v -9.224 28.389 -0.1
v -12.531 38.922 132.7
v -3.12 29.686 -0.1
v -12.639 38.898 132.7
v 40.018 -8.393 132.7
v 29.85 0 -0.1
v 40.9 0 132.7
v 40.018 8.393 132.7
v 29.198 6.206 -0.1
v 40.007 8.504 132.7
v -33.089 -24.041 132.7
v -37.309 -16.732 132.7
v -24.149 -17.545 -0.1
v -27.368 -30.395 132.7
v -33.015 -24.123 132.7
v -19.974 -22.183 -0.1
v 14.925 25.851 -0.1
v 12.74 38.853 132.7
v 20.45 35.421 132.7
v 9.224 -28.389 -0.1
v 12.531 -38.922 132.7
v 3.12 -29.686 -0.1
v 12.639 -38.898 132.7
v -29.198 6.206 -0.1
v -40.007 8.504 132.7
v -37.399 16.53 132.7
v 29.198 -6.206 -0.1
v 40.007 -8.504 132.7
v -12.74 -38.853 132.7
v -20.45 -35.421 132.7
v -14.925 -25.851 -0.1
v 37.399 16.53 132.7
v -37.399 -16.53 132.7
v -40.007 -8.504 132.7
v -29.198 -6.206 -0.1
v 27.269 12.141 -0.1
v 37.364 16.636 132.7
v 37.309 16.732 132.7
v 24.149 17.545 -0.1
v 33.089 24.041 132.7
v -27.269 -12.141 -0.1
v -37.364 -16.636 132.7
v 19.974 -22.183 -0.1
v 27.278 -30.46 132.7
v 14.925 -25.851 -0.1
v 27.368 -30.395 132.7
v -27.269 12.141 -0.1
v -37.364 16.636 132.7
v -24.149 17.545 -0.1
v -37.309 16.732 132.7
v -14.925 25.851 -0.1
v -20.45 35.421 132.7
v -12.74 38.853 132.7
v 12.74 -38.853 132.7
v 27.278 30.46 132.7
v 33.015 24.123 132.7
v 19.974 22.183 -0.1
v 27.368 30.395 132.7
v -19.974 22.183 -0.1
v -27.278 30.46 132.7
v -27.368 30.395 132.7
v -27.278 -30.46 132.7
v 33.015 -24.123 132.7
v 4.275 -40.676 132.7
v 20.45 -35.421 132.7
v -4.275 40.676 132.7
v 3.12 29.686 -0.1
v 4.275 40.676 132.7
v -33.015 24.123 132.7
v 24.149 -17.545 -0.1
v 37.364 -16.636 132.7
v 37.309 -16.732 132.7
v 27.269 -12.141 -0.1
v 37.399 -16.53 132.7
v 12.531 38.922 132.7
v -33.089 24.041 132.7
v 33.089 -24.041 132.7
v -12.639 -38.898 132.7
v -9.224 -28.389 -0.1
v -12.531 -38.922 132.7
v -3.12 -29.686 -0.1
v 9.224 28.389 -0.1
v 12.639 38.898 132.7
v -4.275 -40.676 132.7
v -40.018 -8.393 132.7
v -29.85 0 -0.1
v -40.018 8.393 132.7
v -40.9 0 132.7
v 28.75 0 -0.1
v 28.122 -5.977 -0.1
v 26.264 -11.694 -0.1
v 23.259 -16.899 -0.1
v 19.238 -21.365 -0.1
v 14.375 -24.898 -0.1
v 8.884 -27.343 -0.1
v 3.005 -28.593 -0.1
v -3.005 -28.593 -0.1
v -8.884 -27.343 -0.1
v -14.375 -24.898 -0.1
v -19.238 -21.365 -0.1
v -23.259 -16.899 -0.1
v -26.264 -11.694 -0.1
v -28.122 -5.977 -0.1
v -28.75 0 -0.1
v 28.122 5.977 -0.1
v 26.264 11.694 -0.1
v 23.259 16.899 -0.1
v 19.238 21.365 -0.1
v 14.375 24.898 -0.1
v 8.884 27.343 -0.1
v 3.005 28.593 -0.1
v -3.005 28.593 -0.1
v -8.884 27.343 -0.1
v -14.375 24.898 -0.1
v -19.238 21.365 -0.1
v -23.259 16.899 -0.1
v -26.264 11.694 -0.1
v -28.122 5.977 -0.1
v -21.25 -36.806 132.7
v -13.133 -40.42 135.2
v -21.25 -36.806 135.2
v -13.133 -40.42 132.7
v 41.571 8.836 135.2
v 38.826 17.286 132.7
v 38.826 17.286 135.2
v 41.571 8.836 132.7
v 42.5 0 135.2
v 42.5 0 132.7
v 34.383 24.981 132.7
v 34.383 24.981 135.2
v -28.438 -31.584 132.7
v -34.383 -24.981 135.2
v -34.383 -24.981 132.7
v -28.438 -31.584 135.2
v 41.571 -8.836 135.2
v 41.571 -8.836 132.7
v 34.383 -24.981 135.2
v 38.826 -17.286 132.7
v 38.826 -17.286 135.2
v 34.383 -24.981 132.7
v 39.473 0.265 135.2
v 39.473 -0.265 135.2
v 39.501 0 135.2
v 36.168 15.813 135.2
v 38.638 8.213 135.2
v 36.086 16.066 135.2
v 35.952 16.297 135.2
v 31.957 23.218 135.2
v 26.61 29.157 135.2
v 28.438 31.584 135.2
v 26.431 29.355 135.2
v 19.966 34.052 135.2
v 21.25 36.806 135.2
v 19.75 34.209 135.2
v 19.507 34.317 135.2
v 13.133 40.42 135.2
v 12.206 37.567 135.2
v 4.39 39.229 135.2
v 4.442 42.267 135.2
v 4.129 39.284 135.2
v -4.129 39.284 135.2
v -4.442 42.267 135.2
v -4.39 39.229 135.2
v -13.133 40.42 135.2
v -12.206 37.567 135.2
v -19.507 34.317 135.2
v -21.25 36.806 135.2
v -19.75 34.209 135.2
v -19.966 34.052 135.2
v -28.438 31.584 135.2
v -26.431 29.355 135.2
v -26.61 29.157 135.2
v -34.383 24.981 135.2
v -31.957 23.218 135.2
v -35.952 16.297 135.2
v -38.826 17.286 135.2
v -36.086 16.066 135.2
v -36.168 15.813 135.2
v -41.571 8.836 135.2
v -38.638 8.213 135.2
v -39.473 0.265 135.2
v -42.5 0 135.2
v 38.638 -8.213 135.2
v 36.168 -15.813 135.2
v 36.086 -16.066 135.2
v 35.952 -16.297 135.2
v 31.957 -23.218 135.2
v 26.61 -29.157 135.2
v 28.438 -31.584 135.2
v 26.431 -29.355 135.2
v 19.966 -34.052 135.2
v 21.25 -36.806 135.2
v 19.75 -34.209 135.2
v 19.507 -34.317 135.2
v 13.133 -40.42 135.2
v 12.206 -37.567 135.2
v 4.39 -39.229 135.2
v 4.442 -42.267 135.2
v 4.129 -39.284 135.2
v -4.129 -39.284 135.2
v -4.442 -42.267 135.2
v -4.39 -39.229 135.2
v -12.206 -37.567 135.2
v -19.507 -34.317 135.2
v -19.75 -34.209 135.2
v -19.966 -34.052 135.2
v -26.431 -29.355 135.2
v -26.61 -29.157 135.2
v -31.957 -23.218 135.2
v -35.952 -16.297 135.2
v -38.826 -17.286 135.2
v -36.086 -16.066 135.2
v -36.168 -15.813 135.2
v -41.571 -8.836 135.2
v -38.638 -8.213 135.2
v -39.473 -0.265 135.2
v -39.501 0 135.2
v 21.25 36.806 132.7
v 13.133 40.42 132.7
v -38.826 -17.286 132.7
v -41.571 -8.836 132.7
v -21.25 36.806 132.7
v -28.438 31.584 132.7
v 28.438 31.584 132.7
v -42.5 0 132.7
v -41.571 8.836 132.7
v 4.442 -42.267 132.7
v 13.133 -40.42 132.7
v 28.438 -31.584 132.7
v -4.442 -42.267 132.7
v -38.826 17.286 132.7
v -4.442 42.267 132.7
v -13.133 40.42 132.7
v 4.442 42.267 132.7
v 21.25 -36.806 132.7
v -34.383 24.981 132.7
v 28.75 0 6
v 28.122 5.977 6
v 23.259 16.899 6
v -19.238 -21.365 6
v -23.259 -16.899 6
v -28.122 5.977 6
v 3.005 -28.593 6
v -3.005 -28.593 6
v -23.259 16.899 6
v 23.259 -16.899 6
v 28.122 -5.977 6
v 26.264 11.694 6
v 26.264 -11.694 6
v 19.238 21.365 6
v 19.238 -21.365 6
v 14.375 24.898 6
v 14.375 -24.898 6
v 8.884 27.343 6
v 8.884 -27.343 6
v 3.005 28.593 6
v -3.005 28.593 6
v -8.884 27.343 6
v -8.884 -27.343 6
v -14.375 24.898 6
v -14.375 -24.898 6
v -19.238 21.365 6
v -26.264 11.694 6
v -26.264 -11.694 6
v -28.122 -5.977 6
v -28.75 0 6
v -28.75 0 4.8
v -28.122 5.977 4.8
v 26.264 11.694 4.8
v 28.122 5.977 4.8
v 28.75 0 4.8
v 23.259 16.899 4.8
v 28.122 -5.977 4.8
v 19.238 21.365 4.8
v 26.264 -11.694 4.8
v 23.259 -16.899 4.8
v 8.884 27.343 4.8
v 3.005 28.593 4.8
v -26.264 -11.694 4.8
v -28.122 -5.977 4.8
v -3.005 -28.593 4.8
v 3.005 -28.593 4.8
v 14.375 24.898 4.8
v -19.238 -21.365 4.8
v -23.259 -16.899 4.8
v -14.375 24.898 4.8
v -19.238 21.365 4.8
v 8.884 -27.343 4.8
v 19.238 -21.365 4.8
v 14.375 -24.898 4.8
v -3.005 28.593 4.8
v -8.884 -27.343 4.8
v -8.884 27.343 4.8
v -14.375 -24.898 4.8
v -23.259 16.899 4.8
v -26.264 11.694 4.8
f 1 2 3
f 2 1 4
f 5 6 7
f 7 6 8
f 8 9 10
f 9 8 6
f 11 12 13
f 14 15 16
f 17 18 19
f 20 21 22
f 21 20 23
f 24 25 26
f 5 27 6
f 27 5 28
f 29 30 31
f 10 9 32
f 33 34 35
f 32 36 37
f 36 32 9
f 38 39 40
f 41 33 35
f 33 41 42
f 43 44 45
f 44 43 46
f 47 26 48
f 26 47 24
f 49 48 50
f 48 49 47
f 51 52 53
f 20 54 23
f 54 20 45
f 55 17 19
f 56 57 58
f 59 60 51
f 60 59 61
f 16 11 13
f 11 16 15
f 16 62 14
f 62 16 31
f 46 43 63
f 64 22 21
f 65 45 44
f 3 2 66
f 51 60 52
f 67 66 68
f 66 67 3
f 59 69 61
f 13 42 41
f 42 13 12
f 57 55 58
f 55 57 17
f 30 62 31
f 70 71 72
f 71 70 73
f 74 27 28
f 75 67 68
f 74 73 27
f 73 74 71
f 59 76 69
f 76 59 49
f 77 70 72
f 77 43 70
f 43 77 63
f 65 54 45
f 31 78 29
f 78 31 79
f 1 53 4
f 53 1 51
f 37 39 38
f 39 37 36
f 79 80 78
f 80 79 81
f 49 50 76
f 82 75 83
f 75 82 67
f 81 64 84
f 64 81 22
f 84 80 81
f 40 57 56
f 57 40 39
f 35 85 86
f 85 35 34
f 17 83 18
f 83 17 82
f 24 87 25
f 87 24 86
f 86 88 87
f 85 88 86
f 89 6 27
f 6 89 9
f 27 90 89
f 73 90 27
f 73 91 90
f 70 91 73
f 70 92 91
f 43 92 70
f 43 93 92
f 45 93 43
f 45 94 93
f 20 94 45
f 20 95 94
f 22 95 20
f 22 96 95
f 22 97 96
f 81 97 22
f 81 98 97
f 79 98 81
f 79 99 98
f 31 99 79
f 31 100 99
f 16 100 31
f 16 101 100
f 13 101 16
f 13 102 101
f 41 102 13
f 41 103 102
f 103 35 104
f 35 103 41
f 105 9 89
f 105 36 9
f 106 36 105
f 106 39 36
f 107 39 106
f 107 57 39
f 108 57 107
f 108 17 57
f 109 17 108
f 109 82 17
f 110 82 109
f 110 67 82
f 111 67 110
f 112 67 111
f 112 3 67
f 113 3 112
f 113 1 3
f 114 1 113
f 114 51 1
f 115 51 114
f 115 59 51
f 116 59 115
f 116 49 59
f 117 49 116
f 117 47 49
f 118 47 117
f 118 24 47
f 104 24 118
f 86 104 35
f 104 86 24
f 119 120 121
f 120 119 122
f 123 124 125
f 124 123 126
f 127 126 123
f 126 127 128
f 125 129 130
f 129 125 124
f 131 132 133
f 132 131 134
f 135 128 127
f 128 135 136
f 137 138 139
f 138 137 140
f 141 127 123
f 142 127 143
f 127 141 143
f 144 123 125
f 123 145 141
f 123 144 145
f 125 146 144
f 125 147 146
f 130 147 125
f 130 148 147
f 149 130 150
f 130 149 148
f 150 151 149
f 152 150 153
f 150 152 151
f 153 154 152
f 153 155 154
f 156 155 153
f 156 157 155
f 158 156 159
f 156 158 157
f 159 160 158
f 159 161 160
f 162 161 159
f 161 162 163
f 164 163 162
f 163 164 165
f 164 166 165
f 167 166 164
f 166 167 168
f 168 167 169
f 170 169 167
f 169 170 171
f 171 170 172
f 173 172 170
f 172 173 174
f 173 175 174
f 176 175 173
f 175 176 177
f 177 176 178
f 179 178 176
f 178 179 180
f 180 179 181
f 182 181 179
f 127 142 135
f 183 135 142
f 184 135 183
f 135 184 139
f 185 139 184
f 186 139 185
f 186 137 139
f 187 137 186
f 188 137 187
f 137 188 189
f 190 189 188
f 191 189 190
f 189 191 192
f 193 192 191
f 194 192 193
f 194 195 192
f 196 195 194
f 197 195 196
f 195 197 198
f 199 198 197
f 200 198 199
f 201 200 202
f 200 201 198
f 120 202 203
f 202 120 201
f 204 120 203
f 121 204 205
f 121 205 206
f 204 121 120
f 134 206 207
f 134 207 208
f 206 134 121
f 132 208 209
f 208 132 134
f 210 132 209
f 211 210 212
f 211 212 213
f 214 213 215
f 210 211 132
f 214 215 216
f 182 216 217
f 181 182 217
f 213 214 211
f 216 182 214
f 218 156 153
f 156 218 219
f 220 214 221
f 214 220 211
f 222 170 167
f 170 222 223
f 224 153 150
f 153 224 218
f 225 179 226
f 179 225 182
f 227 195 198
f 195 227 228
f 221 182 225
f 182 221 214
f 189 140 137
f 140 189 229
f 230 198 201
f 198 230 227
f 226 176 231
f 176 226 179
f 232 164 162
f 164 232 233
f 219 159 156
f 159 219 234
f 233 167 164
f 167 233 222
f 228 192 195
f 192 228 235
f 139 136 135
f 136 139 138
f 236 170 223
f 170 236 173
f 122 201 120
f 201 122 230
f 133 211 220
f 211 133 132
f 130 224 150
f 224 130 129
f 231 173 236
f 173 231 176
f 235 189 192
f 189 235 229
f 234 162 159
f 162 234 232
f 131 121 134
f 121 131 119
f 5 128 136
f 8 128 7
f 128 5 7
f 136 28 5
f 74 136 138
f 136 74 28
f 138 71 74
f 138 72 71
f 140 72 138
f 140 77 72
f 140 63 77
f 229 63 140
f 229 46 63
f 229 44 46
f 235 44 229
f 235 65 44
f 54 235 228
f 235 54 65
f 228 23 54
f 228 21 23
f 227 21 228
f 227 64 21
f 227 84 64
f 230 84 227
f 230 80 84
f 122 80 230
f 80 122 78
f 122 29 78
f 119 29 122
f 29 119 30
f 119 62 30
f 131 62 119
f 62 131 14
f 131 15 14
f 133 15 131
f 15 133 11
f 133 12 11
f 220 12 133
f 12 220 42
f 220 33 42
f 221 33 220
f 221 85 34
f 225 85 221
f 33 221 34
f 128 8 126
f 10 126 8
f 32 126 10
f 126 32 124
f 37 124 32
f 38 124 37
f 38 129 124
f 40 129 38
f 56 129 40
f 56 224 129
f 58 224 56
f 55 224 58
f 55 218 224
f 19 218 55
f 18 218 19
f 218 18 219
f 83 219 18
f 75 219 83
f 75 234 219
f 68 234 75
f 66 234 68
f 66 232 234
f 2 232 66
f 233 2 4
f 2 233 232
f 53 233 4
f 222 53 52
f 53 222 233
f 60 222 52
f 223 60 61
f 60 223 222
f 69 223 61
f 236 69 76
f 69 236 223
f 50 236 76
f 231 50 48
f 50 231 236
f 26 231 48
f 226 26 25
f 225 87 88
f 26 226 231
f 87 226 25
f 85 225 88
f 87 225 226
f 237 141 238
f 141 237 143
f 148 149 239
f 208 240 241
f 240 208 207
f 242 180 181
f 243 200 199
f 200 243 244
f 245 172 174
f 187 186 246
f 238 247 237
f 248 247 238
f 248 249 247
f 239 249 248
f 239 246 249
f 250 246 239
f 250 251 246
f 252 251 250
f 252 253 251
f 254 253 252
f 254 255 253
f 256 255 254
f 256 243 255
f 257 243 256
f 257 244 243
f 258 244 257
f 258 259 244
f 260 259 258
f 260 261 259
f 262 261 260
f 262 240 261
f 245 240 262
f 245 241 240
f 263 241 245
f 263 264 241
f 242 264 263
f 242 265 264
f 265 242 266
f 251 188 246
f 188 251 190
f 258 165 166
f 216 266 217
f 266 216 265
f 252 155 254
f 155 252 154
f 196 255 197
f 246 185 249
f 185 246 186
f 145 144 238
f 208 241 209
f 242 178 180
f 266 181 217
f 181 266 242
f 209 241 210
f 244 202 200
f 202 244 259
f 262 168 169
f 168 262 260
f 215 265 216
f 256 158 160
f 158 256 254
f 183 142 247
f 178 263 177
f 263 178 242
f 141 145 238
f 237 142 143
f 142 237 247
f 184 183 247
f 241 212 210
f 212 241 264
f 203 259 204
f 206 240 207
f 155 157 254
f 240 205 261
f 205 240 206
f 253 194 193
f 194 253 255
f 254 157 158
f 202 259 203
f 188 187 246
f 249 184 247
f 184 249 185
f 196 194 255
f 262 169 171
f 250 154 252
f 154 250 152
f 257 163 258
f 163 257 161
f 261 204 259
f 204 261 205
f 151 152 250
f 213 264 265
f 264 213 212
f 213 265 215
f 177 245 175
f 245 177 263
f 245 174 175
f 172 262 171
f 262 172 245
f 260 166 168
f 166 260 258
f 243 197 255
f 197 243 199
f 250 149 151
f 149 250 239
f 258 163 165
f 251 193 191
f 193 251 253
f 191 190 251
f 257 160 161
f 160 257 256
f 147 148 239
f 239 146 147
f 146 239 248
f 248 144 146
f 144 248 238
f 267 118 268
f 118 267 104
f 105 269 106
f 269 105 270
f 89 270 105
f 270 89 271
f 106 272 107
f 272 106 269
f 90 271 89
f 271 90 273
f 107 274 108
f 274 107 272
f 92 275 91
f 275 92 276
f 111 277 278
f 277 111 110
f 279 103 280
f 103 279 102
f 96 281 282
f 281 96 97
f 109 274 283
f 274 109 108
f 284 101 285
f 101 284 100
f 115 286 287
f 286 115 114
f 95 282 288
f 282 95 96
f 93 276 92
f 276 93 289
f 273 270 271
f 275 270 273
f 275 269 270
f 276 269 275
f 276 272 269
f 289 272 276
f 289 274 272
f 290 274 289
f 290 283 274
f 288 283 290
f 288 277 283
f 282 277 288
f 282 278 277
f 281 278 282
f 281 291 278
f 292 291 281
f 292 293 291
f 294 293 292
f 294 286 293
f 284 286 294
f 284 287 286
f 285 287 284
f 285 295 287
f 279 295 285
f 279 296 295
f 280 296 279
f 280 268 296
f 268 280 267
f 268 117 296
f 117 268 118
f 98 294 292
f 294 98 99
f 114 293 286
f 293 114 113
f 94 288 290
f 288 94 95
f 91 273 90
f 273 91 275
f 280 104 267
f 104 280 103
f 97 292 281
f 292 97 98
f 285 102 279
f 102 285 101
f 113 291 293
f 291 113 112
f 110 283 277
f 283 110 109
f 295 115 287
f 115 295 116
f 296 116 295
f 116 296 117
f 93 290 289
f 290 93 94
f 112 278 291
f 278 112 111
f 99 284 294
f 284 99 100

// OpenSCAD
//Start with Cup Dimensions - these are for a Starbucks $1 Reusable Cup
bottom_diameter=59.5;
top_diameter=82;
//Make sure the height is measured as the distance between your top and bottom radius measurements!
height=135;

//Now some basic properties of your sleeve
color="aqua"; //[black,silver,gray,white,maroon,red,purple,fuchsia,green,lime,olive,yellow,navy,blue,teal,aqua,brown,sienna]
thickness=2; //[1:4]
border=3; //[1:30]
sleeve_height_percent=95;//[10:95]
//Use this to move the sleeve up or down on the cup
sleeve_z_offset=0;

//And finally the pattern variables...
line_thickness=4;
sides=6;//[3:20]
size=18;//[1:20]
overlap=5;//[0:10]
//This is the spin of each shape about its center
spin=22.5;//[-90:90]
//This is the amount the pattern is made to "spiral" around the cup, vs. stack straight up
pattern_spin=9;//[0:10]

part=1;//[1:Render,2:Final]

////////////////////////////////

bottom_radius=bottom_diameter/2;
top_radius=top_diameter/2;
rb=bottom_diameter/2+thickness;
rt=top_diameter/2+thickness;
h=height;
lt=line_thickness;
sh=sleeve_height_percent/100*h;
szo=sleeve_z_offset;

res=30;


theta=atan((rt-rb)/h);
count=24-size;
thetac=360/count;
rpb=rb*3.14/count;
rp=rpb*(1+overlap*.2);

rows=round(h/(2*rpb));
echo(rows);
echo(count);
echo(theta);

cup();

module sleeve(){
	color(color)union(){
		intersection(){
			cupwall();
		
			translate([0,0,h/2+szo])cylinder(r=rt*2,h=sh,center=true);
		
			for(i=[0:rows]){
				rotate([0,0,thetac*i/2*pattern_spin/10])
				translate([0,0,2*rpb*i])
				ring();
			}
		}
		
		intersection(){
			cupwall();
			translate([0,0,szo+(h-sh)/2])cylinder(r=rt*2,h=border,$fn=res);
		}
		
		intersection(){
			cupwall();
			translate([0,0,h-border+szo-(h-sh)/2])cylinder(r=rt*2,h=border,$fn=res);
		}
	}
}

module cup(){
	color("white")difference(){
		union(){
			translate([0,0,-.1])cylinder(r1=bottom_radius+.1,r2=top_radius+.1,h=h+.2,$fn=res);
			translate([0,0,h+.2-2.5])cylinder(r=top_radius+1.5,h=2.5,$fn=res);
		}
		translate([0,0,6])cylinder(r1=bottom_radius-1,r2=top_radius-1,h=h+.2,$fn=res);
		translate([0,0,-.2])cylinder(r=bottom_radius-1,h=5,$fn=res);
	}
}


module ring(){
	for(i=[0:count-1])
	rotate([0,0,i*thetac]){
		translate([0,0,rb*tan(theta)+rpb])
		rotate([-90-theta,0,0])
		rotate([0,0,spin])
		difference(){
			cylinder(r1=lt,r2=2*rp,h=2*rb,$fn=sides);
			translate([0,0,-.05])cylinder(r1=0,r2=2*rp-lt,h=2*rb+.1,$fn=sides);
		}
	}
}

module cupwall(){
	difference(){
		cylinder(r1=rb,r2=rt,h=h,$fn=30);
		translate([0,0,-.05])cylinder(r1=bottom_radius,r2=top_radius,h=h+.1,$fn=res);
	}
}
